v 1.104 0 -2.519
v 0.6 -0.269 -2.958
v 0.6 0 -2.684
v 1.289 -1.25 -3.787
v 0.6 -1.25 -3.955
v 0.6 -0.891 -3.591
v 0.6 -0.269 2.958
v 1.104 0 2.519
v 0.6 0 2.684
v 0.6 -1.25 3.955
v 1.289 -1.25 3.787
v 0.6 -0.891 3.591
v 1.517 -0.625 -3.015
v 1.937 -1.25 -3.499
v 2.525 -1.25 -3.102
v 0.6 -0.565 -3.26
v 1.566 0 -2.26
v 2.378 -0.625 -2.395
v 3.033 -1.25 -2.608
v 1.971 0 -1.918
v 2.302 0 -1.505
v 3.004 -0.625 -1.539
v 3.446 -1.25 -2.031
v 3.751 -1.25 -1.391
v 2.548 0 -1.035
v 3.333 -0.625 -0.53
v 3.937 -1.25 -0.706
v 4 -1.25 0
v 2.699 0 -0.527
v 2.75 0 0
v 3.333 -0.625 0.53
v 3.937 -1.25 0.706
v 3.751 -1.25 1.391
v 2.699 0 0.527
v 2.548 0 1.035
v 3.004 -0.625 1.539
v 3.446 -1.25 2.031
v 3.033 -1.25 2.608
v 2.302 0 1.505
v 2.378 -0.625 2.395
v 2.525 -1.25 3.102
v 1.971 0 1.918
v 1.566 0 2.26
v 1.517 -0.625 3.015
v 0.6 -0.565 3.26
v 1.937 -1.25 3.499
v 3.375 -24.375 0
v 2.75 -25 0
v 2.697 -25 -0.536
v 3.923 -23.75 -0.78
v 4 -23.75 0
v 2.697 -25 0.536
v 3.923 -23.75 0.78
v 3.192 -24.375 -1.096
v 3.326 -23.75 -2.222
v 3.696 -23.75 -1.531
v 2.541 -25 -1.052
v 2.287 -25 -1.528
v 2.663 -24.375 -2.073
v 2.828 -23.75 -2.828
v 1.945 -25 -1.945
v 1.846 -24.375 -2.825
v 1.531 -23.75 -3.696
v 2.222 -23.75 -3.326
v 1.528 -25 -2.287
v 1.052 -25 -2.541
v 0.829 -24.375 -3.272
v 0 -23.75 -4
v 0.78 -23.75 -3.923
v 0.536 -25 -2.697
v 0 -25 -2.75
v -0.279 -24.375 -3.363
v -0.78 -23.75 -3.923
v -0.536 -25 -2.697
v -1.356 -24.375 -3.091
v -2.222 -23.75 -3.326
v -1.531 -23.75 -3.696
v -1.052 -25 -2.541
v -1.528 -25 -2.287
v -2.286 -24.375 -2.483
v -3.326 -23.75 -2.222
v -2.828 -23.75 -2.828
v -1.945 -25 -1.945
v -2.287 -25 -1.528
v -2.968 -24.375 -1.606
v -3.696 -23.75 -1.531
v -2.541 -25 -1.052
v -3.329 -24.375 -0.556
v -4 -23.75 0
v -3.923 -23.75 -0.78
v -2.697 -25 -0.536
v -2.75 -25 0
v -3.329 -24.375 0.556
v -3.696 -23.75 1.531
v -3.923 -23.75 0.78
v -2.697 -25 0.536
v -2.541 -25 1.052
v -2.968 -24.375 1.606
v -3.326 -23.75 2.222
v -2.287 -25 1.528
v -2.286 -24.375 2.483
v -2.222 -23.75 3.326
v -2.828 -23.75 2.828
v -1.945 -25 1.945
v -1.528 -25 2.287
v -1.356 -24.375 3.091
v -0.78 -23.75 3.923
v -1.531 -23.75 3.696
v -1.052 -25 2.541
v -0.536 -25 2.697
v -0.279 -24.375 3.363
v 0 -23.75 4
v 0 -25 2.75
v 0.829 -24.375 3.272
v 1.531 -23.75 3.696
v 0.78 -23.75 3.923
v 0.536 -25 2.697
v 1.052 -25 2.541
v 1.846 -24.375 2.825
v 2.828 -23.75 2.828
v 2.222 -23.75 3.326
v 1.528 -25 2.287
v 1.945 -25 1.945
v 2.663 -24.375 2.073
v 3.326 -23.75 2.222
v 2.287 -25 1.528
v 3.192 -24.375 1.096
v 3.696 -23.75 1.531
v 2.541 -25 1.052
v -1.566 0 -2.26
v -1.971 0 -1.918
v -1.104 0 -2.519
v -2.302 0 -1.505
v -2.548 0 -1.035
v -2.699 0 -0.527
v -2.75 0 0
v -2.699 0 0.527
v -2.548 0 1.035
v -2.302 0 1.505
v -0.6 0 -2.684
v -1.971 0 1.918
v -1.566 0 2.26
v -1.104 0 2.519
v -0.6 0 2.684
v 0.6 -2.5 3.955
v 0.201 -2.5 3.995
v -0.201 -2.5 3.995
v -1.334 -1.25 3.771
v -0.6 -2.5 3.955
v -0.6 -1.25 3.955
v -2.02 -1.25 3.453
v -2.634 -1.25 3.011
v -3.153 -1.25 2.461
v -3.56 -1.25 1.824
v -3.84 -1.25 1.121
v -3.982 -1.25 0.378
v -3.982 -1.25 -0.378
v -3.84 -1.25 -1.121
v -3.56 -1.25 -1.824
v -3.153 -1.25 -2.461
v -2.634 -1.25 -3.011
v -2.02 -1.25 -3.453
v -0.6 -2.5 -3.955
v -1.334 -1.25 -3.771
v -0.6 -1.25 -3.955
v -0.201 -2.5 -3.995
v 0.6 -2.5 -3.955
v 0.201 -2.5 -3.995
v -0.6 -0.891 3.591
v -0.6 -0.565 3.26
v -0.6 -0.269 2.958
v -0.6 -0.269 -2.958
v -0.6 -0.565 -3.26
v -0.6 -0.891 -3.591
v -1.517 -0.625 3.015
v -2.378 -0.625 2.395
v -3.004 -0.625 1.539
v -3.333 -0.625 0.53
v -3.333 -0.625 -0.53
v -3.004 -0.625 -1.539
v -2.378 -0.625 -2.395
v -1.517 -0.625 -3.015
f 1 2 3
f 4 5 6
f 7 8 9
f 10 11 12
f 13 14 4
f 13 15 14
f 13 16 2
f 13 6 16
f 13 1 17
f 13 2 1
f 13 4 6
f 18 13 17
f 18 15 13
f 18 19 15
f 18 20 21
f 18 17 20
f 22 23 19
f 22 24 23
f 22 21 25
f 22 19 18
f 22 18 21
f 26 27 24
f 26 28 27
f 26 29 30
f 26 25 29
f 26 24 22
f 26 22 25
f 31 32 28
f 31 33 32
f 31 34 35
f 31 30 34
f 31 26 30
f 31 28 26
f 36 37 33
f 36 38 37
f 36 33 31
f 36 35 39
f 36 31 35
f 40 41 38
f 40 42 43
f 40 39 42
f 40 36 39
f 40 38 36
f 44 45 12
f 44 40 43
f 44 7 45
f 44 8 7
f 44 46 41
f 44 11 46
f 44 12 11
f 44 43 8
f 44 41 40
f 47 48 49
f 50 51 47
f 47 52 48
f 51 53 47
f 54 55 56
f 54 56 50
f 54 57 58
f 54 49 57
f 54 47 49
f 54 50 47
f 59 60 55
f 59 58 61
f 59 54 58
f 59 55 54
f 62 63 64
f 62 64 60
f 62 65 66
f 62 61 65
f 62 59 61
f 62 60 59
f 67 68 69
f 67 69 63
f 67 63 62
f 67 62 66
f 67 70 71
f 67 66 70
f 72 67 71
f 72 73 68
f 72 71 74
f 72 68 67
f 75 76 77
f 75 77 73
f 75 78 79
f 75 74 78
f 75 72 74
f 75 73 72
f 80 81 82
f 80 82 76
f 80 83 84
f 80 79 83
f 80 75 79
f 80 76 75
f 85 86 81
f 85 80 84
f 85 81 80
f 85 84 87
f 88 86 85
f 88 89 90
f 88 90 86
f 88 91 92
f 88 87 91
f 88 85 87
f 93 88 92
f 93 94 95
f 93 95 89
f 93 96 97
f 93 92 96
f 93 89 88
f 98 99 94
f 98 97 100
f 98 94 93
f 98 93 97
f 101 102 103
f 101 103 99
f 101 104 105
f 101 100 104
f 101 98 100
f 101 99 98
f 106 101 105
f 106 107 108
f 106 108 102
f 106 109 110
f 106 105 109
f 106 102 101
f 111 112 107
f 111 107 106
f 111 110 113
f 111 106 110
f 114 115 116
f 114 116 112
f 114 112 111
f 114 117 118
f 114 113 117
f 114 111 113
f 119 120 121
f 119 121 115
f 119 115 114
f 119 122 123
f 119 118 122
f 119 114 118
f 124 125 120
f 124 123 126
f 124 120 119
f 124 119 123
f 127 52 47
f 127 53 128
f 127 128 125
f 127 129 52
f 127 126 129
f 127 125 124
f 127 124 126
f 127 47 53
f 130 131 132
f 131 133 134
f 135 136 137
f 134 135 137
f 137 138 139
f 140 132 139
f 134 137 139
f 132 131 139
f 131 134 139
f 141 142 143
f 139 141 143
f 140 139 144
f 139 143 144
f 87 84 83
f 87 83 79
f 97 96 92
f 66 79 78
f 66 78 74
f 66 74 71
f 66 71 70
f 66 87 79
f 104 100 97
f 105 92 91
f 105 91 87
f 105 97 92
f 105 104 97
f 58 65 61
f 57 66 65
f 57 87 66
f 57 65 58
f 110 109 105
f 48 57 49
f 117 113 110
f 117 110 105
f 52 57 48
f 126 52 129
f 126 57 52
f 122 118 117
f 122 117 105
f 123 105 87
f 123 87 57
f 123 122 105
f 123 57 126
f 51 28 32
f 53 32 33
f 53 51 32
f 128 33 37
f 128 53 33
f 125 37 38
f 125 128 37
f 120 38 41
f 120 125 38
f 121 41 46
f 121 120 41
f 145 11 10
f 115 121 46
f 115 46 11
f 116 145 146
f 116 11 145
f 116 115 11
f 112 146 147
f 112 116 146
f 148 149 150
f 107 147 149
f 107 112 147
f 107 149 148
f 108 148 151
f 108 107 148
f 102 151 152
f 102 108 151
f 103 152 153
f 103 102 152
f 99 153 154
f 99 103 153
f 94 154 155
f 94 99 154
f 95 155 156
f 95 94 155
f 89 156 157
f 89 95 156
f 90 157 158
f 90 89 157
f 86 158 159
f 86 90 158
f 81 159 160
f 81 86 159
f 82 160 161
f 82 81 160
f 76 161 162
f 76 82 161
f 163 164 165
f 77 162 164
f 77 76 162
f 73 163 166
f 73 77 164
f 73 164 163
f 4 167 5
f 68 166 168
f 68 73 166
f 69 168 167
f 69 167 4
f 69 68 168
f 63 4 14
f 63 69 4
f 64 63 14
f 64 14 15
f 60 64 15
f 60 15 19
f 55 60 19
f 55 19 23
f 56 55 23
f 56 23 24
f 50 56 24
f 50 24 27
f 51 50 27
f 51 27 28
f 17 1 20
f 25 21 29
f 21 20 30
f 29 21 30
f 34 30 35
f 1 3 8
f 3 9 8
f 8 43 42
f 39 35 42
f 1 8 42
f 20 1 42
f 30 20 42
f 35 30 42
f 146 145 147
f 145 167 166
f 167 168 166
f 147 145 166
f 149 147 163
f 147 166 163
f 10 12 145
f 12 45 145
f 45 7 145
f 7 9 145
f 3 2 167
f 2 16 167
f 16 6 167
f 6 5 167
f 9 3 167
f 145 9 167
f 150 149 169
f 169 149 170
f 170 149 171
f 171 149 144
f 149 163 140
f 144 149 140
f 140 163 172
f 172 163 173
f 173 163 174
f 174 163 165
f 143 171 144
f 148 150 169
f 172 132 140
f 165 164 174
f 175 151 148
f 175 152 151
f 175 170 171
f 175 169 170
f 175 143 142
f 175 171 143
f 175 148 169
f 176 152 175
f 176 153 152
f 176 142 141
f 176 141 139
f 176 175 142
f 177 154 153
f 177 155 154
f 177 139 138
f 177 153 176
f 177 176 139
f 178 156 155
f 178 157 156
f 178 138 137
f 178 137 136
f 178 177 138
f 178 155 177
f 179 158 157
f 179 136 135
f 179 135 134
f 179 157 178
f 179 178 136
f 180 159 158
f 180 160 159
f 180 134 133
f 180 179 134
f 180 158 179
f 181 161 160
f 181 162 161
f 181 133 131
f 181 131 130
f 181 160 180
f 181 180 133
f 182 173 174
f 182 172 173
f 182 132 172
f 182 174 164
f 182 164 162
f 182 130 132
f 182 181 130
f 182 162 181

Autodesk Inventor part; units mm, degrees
ref_plane "YZ Plane" through (0, 0, 0) normal (1, 0, 0) x (0, 1, 0)
ref_plane "XZ Plane" through (0, 0, 0) normal (0, 1, 0) x (-1, 0, 0)
ref_plane "XY Plane" through (0, 0, 0) normal (0, 0, 1) x (1, 0, 0)
sketch "Sketch1" plane through (0, 0, 0) normal (0, 0, 1) x (1, 0, 0)
  line L0 (0, 0) -> (0, -25)
  line L1 (0, 0) -> (2.75, 0)
  line L2 (2.75, 0) -> (4, -1.25)
  line L3 (4, -1.25) -> (4, -25)
  line L4 (4, -25) -> (0, -25)
  dimension "d0" = 8
  dimension "d1" = 5.5
  dimension "d2" = 45
  dimension "d14" = 25
revolve "Вращение1" add sketch "Sketch1" angle 360 about axis through (0, 0, 0) along (0, -1, 0)
thread "Резьба1" size "M8x1.25" class "6g" standard "ISO Metric profile" full length
sketch "Sketch2" plane through (0, 0, 0) normal (0, 0, 1) x (1, 0, 0)
  line L0 (-0.6, 0) -> (0.6, 0)
  line L1 (0.6, 0) -> (0.6, -2.5)
  line L2 (0.6, -2.5) -> (-0.6, -2.5)
  line L3 (-0.6, -2.5) -> (-0.6, 0)
  line L4 (0, 0) -> (0, -2.5)
  dimension "d9" = 1.2
  dimension "d10" = 2.5
extrude "Выдавливание1" cut sketch "Sketch2" along normal through all both and the other way through all
chamfer "Фаска1" distance 1.25 angle 45 1 edges at (-4, -25, 0)
equation "\"d9\" = n"
equation "\"d10\" = t"
equation "\"d19\" = -0.5 * dp + 0.5 * d_"
equation "\"d0\" = d_"
equation "\"d1\" = df_"
equation "\"d2\" = an"
equation "\"d14\" = l_"
equation "\"df_\" = 5.5"
equation "\"t\" = 2.5"
equation "\"n\" = 1.2"
equation "\"d_\" = 8"
equation "\"dp\" = 5.5"
equation "\"l_\" = 25"
equation "\"an\" = 45deg"
properties part number "Винт M8-6gx25 ГОСТ 1477-93" material "Сталь, мягкая"
